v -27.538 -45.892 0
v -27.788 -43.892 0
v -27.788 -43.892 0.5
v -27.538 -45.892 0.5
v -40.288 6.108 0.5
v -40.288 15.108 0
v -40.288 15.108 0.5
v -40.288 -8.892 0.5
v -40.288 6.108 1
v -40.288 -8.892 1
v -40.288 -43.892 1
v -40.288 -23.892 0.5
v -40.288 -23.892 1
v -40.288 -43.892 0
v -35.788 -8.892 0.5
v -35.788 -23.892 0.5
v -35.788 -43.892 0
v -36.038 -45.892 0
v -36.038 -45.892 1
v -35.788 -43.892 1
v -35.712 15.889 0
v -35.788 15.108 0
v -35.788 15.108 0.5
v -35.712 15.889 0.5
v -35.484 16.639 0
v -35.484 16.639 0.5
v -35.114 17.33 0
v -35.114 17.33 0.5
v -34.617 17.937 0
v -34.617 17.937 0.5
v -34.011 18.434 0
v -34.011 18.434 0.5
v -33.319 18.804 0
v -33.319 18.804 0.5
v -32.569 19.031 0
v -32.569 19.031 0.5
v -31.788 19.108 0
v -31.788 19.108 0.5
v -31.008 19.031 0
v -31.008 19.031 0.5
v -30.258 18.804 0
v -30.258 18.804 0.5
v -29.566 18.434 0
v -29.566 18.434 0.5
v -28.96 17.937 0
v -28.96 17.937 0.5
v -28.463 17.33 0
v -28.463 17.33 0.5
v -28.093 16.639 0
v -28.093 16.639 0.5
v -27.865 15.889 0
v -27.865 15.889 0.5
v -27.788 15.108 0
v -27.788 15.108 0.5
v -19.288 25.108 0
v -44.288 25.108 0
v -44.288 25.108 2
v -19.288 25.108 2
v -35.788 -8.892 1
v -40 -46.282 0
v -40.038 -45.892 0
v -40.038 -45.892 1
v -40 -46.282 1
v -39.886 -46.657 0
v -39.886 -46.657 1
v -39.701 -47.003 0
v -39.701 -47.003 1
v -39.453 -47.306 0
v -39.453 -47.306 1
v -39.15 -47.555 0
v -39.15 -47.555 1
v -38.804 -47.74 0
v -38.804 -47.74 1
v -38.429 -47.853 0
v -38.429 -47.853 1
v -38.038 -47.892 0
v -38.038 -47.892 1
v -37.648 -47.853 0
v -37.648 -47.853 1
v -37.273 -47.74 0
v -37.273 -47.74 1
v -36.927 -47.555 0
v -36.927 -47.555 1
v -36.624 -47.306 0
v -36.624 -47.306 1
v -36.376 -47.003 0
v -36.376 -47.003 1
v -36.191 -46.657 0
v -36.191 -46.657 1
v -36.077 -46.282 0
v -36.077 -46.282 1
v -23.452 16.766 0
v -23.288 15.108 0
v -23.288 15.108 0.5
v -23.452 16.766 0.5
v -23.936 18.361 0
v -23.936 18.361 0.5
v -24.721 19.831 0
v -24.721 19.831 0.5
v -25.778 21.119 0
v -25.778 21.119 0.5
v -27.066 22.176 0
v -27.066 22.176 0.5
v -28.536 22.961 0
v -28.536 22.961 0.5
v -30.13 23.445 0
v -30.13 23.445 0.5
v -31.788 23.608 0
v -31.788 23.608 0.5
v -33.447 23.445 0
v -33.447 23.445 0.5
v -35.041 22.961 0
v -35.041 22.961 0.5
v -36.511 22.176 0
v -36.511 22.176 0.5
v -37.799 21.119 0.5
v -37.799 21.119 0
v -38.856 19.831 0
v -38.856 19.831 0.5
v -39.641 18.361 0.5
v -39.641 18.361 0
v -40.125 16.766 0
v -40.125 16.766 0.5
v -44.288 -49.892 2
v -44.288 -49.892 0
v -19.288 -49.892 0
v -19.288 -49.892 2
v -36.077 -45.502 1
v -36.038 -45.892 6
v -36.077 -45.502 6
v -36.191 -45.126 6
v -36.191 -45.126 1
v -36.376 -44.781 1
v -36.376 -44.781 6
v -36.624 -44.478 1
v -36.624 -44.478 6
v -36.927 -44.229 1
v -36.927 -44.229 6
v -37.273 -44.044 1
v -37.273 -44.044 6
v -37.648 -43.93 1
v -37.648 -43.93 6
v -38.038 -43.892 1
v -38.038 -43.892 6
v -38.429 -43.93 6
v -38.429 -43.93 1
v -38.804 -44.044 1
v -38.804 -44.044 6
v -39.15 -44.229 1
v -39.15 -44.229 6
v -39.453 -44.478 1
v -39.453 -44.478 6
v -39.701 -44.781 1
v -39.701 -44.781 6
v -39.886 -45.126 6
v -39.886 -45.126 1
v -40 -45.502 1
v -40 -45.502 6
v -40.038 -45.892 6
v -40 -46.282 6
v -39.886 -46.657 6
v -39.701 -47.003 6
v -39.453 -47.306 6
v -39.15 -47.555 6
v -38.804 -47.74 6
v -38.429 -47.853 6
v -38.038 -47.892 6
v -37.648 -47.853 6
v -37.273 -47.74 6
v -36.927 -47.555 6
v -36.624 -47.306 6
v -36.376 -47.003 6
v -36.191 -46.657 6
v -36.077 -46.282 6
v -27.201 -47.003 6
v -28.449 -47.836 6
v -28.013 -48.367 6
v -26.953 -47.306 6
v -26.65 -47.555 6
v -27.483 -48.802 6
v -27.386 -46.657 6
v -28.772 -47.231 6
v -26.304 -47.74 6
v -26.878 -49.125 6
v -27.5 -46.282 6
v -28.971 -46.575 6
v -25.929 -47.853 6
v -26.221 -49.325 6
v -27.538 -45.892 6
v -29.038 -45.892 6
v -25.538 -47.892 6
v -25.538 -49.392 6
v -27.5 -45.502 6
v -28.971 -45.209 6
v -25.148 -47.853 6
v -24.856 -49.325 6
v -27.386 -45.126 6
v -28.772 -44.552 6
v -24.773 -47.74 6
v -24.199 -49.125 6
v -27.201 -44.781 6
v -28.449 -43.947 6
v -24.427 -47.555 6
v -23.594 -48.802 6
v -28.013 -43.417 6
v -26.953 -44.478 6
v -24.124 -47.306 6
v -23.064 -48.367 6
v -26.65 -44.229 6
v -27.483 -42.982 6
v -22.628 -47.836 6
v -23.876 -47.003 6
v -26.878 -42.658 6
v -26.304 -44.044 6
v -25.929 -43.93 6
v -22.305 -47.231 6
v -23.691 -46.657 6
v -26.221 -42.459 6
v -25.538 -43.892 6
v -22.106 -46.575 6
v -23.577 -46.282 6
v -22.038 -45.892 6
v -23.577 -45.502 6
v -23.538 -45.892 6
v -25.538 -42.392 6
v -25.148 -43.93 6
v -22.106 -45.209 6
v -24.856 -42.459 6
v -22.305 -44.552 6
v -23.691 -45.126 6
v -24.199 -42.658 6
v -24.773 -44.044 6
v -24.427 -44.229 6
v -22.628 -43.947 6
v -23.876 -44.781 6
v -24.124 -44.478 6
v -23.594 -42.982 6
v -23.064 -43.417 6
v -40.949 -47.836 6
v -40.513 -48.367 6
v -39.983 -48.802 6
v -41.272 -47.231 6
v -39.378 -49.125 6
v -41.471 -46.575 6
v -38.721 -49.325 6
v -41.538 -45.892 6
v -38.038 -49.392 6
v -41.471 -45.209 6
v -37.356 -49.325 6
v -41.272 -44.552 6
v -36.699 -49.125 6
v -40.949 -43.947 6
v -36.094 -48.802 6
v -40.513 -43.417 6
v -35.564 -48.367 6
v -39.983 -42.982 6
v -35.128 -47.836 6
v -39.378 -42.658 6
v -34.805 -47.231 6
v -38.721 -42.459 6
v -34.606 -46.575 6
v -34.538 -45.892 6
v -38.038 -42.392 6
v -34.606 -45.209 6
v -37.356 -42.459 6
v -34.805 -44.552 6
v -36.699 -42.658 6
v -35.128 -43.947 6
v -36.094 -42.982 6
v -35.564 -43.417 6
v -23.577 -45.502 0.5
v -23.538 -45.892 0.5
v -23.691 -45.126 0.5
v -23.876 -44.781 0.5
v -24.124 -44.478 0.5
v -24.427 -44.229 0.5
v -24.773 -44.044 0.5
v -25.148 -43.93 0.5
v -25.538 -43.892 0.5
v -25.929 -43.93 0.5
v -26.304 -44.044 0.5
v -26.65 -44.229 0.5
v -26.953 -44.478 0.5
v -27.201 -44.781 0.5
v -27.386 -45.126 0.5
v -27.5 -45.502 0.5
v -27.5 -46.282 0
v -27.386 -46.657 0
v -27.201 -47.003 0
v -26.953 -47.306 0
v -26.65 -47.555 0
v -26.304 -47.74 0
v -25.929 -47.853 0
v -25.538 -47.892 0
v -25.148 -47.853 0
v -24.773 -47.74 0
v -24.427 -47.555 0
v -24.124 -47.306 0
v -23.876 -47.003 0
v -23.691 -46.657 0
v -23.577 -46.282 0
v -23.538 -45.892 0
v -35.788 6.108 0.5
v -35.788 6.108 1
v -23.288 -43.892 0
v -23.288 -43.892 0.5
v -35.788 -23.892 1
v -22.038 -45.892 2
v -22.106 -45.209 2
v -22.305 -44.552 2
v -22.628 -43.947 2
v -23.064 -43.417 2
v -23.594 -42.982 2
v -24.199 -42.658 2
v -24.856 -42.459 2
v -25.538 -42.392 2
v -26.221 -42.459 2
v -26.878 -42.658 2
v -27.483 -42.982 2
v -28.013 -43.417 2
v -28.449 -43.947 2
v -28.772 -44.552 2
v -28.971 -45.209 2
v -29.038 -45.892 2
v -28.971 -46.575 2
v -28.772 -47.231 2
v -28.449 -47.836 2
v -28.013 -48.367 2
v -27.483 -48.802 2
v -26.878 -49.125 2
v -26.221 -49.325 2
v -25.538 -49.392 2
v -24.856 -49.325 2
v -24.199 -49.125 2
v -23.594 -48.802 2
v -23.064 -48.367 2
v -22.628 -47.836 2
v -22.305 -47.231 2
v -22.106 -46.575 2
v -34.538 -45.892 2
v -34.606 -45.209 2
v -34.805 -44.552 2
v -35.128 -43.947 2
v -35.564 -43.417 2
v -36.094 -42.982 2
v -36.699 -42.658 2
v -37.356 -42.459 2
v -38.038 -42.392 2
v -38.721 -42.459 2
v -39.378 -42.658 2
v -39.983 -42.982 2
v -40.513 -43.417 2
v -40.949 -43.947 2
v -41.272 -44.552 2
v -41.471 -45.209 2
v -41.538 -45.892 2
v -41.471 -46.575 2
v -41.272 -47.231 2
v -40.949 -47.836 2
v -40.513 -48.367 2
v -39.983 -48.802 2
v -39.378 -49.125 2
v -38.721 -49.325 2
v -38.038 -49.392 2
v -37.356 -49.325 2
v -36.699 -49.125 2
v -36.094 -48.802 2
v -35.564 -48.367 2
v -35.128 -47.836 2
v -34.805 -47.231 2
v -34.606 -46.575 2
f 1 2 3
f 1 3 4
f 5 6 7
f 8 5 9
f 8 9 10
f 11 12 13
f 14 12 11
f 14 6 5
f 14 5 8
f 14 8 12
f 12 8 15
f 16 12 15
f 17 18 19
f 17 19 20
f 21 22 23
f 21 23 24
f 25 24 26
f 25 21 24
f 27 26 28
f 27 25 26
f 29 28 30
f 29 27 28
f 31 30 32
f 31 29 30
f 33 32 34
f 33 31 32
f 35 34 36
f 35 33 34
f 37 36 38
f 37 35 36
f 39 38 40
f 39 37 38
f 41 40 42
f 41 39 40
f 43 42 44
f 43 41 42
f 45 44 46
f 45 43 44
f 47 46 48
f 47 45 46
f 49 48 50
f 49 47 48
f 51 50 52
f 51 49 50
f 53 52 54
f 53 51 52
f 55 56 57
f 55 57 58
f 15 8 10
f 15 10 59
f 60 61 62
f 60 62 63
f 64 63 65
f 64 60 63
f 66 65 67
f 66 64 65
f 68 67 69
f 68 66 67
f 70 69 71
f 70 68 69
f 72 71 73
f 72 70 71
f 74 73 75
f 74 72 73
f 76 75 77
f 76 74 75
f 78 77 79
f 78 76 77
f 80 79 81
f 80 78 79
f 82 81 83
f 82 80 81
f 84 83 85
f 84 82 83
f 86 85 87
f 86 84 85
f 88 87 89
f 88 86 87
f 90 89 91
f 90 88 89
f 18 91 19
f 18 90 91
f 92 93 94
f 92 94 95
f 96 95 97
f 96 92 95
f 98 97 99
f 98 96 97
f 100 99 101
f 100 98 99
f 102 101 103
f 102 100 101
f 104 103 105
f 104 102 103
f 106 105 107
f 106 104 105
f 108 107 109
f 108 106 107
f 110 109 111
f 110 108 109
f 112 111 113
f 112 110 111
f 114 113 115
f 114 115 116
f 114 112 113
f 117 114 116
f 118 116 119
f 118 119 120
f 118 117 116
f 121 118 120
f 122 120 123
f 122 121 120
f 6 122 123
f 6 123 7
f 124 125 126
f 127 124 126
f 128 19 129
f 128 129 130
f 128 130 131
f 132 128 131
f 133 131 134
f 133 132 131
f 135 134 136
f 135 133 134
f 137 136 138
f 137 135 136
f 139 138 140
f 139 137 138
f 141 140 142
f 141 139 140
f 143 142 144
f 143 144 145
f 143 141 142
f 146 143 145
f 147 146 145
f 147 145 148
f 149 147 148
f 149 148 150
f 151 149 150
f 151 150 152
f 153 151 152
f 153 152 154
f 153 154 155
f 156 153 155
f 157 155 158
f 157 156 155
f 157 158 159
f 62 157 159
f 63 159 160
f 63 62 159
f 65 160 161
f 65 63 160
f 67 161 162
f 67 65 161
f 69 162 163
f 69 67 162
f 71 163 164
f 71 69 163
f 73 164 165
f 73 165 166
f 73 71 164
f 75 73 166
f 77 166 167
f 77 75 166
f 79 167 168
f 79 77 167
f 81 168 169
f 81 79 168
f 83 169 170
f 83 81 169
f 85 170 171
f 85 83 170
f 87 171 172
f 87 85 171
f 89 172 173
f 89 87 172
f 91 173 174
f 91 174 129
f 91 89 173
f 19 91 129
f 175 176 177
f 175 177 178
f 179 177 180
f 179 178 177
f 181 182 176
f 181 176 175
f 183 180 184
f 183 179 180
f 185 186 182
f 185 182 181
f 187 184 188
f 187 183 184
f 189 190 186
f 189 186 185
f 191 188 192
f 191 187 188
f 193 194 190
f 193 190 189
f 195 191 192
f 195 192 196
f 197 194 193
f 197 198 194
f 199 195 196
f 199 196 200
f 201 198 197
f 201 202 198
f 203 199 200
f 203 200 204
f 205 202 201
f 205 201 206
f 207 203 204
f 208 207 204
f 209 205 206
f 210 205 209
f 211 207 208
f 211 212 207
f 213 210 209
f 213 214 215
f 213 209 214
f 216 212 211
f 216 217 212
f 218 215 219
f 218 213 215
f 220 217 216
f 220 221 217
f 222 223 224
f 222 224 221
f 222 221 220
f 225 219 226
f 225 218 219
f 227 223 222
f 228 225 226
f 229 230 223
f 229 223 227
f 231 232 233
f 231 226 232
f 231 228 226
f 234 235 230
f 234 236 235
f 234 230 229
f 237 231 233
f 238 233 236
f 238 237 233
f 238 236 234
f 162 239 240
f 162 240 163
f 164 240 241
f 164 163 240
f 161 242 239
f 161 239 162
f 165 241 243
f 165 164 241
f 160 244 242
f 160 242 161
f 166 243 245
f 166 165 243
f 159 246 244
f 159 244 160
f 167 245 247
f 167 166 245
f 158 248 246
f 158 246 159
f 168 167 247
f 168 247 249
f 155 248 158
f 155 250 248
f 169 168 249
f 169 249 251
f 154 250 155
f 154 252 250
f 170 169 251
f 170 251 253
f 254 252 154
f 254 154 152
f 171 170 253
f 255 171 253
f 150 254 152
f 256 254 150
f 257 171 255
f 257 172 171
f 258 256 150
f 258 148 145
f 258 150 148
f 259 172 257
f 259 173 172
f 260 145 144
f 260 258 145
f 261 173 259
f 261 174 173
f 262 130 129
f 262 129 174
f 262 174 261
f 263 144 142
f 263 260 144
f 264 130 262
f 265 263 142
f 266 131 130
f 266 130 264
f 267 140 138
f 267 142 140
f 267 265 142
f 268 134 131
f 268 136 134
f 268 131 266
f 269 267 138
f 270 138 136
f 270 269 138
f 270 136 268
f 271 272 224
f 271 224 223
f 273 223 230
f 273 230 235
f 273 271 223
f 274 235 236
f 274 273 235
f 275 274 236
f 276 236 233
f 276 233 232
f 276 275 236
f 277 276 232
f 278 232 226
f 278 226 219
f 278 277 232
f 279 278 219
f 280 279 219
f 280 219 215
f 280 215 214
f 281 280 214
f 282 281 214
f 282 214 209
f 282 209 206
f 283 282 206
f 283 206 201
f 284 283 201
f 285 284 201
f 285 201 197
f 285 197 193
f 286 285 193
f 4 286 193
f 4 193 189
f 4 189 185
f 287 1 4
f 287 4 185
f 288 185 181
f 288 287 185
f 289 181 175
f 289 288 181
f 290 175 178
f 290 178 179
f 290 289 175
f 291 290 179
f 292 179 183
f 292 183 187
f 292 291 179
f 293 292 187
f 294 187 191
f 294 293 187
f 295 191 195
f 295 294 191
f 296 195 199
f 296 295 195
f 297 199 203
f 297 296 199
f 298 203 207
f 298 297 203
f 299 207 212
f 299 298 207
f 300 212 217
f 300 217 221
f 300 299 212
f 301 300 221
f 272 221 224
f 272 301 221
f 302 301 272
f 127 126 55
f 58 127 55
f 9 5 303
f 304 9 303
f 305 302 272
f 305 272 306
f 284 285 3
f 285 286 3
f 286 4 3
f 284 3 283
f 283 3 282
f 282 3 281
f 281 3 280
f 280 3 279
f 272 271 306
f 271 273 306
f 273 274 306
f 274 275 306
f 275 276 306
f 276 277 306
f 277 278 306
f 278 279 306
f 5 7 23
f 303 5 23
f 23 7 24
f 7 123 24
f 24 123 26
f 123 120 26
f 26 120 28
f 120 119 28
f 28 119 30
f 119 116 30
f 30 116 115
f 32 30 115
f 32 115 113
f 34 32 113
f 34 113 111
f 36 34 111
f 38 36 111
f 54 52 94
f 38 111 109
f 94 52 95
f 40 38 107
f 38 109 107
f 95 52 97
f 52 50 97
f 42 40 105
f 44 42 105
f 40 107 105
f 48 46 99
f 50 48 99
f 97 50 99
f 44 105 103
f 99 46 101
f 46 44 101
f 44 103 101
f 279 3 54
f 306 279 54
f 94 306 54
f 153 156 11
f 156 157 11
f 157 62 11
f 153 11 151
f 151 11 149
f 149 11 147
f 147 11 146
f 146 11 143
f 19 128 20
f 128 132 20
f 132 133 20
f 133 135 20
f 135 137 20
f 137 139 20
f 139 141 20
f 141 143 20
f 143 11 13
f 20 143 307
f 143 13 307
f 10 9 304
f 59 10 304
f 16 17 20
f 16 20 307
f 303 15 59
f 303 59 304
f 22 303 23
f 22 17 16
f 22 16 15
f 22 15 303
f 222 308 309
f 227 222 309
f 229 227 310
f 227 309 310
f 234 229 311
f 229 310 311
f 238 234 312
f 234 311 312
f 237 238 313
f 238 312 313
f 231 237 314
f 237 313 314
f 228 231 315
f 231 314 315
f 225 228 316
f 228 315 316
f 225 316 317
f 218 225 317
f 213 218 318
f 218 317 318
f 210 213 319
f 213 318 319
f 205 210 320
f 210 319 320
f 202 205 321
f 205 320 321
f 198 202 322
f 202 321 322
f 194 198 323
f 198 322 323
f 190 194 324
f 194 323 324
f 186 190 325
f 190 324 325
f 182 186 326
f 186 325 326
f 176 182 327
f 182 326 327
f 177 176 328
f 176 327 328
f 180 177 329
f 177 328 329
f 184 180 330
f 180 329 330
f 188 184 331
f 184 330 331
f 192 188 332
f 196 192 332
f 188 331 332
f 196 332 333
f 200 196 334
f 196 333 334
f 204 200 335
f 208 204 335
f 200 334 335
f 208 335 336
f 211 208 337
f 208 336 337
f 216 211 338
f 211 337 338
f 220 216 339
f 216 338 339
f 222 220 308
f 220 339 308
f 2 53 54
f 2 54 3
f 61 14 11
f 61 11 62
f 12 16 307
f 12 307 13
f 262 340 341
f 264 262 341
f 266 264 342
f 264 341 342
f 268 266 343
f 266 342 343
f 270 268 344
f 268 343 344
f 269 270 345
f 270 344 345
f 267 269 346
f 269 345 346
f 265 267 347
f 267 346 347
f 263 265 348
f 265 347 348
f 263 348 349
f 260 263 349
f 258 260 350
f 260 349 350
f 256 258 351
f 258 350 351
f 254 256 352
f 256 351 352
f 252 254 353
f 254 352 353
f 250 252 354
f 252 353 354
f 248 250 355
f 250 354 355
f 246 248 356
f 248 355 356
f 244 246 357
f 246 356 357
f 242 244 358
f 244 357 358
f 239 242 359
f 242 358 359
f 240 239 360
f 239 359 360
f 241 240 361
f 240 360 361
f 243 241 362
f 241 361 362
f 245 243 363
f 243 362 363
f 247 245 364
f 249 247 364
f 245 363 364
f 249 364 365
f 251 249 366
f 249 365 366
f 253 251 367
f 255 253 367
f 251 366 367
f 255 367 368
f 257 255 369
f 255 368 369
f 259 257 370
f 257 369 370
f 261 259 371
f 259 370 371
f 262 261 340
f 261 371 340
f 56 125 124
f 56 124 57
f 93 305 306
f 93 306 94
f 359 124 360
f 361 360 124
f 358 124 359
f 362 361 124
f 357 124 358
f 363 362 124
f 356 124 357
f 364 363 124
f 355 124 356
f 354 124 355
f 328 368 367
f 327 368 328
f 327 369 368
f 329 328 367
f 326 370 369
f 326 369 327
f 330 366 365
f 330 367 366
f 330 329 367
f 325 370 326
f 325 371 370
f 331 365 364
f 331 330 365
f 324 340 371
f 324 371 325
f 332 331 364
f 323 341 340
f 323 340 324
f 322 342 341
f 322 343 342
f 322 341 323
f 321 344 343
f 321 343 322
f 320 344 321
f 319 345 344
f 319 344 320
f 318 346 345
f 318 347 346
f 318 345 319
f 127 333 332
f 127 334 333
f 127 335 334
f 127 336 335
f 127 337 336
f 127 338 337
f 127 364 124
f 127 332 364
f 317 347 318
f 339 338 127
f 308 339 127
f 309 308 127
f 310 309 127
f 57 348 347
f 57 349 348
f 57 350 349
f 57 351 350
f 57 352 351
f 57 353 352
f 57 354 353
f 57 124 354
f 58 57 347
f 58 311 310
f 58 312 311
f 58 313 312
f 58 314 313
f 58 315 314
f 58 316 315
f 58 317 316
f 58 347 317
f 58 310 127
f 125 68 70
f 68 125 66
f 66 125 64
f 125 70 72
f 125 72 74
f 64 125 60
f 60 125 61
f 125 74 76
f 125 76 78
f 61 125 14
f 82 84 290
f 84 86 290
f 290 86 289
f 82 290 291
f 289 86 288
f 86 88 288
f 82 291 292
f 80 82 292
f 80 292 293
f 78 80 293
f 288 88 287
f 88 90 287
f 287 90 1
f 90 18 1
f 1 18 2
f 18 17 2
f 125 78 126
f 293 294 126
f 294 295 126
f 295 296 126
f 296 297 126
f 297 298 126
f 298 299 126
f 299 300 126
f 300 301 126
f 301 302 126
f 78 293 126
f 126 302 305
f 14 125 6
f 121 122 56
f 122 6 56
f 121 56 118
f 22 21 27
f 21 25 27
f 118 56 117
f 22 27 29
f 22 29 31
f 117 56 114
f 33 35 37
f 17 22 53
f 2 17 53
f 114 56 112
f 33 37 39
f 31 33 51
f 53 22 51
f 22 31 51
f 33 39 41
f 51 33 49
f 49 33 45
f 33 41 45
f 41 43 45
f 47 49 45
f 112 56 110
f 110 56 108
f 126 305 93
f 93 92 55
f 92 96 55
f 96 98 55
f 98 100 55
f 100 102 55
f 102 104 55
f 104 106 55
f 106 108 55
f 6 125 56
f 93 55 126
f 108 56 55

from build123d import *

# Parameters (mm, degrees)
F0_W      = 25
F0_H      = 75
F3_DEPTH  = 2
F4_DEPTH  = 0.5
F6_R      = 3.5
F6_R_2    = 2
F7_DEPTH  = 4
F8_DEPTH  = 1
F9_W      = 4.5
F9_H      = 15
F10_DEPTH = 1
F11_DEPTH = 2


with BuildPart() as f3:
    # F0 (on Top) → F3 (new body)
    with BuildSketch(Plane.XY):
        with Locations((-31.788486, -12.391831)):
            Rectangle(F0_W, F0_H)
    extrude(amount=F3_DEPTH)

    # F1 (on face) → F4 (cut)
    with BuildSketch(Plane.XY):
        with BuildLine():
            ThreePointArc((-27.538486, -45.891831), (-25.538486, -47.891831), (-23.538486, -45.891831))
            ThreePointArc((-23.538486, -45.891831), (-25.538486, -43.891831), (-27.538486, -45.891831))
        make_face()
        with BuildLine():
            ThreePointArc((-27.538486, -45.891831), (-25.538486, -43.891831), (-23.538486, -45.891831))
            Line((-23.538486, -45.891831), (-23.288486, -43.891831))
            Line((-23.288486, -43.891831), (-23.288486, 15.108169))
            ThreePointArc((-23.288486, 15.108169), (-31.788486, 23.608169), (-40.288486, 15.108169))
            Line((-40.288486, 15.108169), (-40.288486, -43.891831))
            Line((-40.288486, -43.891831), (-40.038486, -45.891831))
            ThreePointArc((-40.038486, -45.891831), (-38.038486, -43.891831), (-36.038486, -45.891831))
            Line((-36.038486, -45.891831), (-35.788486, -43.891831))
            Line((-35.788486, -43.891831), (-35.788486, 15.108169))
            ThreePointArc((-35.788486, 15.108169), (-31.788486, 19.108169), (-27.788486, 15.108169))
            Line((-27.788486, 15.108169), (-27.788486, -43.891831))
            Line((-27.788486, -43.891831), (-27.538486, -45.891831))
        make_face()
        with BuildLine():
            ThreePointArc((-36.038486, -45.891831), (-38.038486, -43.891831), (-40.038486, -45.891831))
            ThreePointArc((-40.038486, -45.891831), (-38.038486, -47.891831), (-36.038486, -45.891831))
        make_face()
    extrude(amount=F4_DEPTH, mode=Mode.SUBTRACT)

    # F6 (on face) → F7 (join)
    with BuildSketch(Plane.XY.offset(2)):
        with Locations((-38.038486, -45.891831)):
            Circle(F6_R)
        with Locations((-38.038486, -45.891831)):
            Circle(F6_R_2, mode=Mode.SUBTRACT)
        with Locations((-25.538486, -45.891831)):
            Circle(F6_R)
        with Locations((-25.538486, -45.891831)):
            Circle(F6_R_2, mode=Mode.SUBTRACT)
    extrude(amount=F7_DEPTH)

    # F6 (on face) → F8 (cut)
    with BuildSketch(Plane.XY.offset(2)):
        with Locations((-25.538486, -45.891831)):
            Circle(F6_R_2)
        with Locations((-38.038486, -45.891831)):
            Circle(F6_R_2)
    extrude(amount=-F8_DEPTH, mode=Mode.SUBTRACT)

    # F9 (on face) → F10 (cut)
    with BuildSketch(Plane.XY):
        with BuildLine():
            Line((-40.288486, -43.891831), (-40.038486, -45.891831))
            ThreePointArc((-40.038486, -45.891831), (-38.038486, -47.891831), (-36.038486, -45.891831))
            Line((-36.038486, -45.891831), (-35.788486, -43.891831))
            Line((-35.788486, -43.891831), (-35.788486, -23.891831))
            Line((-35.788486, -23.891831), (-40.288486, -23.891831))
            Line((-40.288486, -23.891831), (-40.288486, -43.891831))
        make_face()
        with Locations((-38.038486, -1.391831)):
            Rectangle(F9_W, F9_H)
    extrude(amount=F10_DEPTH, mode=Mode.SUBTRACT)

    # F6 (on face) → F11 (cut)
    with BuildSketch(Plane.XY.offset(2)):
        with Locations((-25.538486, -45.891831)):
            Circle(F6_R_2)
        with Locations((-38.038486, -45.891831)):
            Circle(F6_R_2)
    extrude(amount=-F11_DEPTH, mode=Mode.SUBTRACT)


solid = f3.part
